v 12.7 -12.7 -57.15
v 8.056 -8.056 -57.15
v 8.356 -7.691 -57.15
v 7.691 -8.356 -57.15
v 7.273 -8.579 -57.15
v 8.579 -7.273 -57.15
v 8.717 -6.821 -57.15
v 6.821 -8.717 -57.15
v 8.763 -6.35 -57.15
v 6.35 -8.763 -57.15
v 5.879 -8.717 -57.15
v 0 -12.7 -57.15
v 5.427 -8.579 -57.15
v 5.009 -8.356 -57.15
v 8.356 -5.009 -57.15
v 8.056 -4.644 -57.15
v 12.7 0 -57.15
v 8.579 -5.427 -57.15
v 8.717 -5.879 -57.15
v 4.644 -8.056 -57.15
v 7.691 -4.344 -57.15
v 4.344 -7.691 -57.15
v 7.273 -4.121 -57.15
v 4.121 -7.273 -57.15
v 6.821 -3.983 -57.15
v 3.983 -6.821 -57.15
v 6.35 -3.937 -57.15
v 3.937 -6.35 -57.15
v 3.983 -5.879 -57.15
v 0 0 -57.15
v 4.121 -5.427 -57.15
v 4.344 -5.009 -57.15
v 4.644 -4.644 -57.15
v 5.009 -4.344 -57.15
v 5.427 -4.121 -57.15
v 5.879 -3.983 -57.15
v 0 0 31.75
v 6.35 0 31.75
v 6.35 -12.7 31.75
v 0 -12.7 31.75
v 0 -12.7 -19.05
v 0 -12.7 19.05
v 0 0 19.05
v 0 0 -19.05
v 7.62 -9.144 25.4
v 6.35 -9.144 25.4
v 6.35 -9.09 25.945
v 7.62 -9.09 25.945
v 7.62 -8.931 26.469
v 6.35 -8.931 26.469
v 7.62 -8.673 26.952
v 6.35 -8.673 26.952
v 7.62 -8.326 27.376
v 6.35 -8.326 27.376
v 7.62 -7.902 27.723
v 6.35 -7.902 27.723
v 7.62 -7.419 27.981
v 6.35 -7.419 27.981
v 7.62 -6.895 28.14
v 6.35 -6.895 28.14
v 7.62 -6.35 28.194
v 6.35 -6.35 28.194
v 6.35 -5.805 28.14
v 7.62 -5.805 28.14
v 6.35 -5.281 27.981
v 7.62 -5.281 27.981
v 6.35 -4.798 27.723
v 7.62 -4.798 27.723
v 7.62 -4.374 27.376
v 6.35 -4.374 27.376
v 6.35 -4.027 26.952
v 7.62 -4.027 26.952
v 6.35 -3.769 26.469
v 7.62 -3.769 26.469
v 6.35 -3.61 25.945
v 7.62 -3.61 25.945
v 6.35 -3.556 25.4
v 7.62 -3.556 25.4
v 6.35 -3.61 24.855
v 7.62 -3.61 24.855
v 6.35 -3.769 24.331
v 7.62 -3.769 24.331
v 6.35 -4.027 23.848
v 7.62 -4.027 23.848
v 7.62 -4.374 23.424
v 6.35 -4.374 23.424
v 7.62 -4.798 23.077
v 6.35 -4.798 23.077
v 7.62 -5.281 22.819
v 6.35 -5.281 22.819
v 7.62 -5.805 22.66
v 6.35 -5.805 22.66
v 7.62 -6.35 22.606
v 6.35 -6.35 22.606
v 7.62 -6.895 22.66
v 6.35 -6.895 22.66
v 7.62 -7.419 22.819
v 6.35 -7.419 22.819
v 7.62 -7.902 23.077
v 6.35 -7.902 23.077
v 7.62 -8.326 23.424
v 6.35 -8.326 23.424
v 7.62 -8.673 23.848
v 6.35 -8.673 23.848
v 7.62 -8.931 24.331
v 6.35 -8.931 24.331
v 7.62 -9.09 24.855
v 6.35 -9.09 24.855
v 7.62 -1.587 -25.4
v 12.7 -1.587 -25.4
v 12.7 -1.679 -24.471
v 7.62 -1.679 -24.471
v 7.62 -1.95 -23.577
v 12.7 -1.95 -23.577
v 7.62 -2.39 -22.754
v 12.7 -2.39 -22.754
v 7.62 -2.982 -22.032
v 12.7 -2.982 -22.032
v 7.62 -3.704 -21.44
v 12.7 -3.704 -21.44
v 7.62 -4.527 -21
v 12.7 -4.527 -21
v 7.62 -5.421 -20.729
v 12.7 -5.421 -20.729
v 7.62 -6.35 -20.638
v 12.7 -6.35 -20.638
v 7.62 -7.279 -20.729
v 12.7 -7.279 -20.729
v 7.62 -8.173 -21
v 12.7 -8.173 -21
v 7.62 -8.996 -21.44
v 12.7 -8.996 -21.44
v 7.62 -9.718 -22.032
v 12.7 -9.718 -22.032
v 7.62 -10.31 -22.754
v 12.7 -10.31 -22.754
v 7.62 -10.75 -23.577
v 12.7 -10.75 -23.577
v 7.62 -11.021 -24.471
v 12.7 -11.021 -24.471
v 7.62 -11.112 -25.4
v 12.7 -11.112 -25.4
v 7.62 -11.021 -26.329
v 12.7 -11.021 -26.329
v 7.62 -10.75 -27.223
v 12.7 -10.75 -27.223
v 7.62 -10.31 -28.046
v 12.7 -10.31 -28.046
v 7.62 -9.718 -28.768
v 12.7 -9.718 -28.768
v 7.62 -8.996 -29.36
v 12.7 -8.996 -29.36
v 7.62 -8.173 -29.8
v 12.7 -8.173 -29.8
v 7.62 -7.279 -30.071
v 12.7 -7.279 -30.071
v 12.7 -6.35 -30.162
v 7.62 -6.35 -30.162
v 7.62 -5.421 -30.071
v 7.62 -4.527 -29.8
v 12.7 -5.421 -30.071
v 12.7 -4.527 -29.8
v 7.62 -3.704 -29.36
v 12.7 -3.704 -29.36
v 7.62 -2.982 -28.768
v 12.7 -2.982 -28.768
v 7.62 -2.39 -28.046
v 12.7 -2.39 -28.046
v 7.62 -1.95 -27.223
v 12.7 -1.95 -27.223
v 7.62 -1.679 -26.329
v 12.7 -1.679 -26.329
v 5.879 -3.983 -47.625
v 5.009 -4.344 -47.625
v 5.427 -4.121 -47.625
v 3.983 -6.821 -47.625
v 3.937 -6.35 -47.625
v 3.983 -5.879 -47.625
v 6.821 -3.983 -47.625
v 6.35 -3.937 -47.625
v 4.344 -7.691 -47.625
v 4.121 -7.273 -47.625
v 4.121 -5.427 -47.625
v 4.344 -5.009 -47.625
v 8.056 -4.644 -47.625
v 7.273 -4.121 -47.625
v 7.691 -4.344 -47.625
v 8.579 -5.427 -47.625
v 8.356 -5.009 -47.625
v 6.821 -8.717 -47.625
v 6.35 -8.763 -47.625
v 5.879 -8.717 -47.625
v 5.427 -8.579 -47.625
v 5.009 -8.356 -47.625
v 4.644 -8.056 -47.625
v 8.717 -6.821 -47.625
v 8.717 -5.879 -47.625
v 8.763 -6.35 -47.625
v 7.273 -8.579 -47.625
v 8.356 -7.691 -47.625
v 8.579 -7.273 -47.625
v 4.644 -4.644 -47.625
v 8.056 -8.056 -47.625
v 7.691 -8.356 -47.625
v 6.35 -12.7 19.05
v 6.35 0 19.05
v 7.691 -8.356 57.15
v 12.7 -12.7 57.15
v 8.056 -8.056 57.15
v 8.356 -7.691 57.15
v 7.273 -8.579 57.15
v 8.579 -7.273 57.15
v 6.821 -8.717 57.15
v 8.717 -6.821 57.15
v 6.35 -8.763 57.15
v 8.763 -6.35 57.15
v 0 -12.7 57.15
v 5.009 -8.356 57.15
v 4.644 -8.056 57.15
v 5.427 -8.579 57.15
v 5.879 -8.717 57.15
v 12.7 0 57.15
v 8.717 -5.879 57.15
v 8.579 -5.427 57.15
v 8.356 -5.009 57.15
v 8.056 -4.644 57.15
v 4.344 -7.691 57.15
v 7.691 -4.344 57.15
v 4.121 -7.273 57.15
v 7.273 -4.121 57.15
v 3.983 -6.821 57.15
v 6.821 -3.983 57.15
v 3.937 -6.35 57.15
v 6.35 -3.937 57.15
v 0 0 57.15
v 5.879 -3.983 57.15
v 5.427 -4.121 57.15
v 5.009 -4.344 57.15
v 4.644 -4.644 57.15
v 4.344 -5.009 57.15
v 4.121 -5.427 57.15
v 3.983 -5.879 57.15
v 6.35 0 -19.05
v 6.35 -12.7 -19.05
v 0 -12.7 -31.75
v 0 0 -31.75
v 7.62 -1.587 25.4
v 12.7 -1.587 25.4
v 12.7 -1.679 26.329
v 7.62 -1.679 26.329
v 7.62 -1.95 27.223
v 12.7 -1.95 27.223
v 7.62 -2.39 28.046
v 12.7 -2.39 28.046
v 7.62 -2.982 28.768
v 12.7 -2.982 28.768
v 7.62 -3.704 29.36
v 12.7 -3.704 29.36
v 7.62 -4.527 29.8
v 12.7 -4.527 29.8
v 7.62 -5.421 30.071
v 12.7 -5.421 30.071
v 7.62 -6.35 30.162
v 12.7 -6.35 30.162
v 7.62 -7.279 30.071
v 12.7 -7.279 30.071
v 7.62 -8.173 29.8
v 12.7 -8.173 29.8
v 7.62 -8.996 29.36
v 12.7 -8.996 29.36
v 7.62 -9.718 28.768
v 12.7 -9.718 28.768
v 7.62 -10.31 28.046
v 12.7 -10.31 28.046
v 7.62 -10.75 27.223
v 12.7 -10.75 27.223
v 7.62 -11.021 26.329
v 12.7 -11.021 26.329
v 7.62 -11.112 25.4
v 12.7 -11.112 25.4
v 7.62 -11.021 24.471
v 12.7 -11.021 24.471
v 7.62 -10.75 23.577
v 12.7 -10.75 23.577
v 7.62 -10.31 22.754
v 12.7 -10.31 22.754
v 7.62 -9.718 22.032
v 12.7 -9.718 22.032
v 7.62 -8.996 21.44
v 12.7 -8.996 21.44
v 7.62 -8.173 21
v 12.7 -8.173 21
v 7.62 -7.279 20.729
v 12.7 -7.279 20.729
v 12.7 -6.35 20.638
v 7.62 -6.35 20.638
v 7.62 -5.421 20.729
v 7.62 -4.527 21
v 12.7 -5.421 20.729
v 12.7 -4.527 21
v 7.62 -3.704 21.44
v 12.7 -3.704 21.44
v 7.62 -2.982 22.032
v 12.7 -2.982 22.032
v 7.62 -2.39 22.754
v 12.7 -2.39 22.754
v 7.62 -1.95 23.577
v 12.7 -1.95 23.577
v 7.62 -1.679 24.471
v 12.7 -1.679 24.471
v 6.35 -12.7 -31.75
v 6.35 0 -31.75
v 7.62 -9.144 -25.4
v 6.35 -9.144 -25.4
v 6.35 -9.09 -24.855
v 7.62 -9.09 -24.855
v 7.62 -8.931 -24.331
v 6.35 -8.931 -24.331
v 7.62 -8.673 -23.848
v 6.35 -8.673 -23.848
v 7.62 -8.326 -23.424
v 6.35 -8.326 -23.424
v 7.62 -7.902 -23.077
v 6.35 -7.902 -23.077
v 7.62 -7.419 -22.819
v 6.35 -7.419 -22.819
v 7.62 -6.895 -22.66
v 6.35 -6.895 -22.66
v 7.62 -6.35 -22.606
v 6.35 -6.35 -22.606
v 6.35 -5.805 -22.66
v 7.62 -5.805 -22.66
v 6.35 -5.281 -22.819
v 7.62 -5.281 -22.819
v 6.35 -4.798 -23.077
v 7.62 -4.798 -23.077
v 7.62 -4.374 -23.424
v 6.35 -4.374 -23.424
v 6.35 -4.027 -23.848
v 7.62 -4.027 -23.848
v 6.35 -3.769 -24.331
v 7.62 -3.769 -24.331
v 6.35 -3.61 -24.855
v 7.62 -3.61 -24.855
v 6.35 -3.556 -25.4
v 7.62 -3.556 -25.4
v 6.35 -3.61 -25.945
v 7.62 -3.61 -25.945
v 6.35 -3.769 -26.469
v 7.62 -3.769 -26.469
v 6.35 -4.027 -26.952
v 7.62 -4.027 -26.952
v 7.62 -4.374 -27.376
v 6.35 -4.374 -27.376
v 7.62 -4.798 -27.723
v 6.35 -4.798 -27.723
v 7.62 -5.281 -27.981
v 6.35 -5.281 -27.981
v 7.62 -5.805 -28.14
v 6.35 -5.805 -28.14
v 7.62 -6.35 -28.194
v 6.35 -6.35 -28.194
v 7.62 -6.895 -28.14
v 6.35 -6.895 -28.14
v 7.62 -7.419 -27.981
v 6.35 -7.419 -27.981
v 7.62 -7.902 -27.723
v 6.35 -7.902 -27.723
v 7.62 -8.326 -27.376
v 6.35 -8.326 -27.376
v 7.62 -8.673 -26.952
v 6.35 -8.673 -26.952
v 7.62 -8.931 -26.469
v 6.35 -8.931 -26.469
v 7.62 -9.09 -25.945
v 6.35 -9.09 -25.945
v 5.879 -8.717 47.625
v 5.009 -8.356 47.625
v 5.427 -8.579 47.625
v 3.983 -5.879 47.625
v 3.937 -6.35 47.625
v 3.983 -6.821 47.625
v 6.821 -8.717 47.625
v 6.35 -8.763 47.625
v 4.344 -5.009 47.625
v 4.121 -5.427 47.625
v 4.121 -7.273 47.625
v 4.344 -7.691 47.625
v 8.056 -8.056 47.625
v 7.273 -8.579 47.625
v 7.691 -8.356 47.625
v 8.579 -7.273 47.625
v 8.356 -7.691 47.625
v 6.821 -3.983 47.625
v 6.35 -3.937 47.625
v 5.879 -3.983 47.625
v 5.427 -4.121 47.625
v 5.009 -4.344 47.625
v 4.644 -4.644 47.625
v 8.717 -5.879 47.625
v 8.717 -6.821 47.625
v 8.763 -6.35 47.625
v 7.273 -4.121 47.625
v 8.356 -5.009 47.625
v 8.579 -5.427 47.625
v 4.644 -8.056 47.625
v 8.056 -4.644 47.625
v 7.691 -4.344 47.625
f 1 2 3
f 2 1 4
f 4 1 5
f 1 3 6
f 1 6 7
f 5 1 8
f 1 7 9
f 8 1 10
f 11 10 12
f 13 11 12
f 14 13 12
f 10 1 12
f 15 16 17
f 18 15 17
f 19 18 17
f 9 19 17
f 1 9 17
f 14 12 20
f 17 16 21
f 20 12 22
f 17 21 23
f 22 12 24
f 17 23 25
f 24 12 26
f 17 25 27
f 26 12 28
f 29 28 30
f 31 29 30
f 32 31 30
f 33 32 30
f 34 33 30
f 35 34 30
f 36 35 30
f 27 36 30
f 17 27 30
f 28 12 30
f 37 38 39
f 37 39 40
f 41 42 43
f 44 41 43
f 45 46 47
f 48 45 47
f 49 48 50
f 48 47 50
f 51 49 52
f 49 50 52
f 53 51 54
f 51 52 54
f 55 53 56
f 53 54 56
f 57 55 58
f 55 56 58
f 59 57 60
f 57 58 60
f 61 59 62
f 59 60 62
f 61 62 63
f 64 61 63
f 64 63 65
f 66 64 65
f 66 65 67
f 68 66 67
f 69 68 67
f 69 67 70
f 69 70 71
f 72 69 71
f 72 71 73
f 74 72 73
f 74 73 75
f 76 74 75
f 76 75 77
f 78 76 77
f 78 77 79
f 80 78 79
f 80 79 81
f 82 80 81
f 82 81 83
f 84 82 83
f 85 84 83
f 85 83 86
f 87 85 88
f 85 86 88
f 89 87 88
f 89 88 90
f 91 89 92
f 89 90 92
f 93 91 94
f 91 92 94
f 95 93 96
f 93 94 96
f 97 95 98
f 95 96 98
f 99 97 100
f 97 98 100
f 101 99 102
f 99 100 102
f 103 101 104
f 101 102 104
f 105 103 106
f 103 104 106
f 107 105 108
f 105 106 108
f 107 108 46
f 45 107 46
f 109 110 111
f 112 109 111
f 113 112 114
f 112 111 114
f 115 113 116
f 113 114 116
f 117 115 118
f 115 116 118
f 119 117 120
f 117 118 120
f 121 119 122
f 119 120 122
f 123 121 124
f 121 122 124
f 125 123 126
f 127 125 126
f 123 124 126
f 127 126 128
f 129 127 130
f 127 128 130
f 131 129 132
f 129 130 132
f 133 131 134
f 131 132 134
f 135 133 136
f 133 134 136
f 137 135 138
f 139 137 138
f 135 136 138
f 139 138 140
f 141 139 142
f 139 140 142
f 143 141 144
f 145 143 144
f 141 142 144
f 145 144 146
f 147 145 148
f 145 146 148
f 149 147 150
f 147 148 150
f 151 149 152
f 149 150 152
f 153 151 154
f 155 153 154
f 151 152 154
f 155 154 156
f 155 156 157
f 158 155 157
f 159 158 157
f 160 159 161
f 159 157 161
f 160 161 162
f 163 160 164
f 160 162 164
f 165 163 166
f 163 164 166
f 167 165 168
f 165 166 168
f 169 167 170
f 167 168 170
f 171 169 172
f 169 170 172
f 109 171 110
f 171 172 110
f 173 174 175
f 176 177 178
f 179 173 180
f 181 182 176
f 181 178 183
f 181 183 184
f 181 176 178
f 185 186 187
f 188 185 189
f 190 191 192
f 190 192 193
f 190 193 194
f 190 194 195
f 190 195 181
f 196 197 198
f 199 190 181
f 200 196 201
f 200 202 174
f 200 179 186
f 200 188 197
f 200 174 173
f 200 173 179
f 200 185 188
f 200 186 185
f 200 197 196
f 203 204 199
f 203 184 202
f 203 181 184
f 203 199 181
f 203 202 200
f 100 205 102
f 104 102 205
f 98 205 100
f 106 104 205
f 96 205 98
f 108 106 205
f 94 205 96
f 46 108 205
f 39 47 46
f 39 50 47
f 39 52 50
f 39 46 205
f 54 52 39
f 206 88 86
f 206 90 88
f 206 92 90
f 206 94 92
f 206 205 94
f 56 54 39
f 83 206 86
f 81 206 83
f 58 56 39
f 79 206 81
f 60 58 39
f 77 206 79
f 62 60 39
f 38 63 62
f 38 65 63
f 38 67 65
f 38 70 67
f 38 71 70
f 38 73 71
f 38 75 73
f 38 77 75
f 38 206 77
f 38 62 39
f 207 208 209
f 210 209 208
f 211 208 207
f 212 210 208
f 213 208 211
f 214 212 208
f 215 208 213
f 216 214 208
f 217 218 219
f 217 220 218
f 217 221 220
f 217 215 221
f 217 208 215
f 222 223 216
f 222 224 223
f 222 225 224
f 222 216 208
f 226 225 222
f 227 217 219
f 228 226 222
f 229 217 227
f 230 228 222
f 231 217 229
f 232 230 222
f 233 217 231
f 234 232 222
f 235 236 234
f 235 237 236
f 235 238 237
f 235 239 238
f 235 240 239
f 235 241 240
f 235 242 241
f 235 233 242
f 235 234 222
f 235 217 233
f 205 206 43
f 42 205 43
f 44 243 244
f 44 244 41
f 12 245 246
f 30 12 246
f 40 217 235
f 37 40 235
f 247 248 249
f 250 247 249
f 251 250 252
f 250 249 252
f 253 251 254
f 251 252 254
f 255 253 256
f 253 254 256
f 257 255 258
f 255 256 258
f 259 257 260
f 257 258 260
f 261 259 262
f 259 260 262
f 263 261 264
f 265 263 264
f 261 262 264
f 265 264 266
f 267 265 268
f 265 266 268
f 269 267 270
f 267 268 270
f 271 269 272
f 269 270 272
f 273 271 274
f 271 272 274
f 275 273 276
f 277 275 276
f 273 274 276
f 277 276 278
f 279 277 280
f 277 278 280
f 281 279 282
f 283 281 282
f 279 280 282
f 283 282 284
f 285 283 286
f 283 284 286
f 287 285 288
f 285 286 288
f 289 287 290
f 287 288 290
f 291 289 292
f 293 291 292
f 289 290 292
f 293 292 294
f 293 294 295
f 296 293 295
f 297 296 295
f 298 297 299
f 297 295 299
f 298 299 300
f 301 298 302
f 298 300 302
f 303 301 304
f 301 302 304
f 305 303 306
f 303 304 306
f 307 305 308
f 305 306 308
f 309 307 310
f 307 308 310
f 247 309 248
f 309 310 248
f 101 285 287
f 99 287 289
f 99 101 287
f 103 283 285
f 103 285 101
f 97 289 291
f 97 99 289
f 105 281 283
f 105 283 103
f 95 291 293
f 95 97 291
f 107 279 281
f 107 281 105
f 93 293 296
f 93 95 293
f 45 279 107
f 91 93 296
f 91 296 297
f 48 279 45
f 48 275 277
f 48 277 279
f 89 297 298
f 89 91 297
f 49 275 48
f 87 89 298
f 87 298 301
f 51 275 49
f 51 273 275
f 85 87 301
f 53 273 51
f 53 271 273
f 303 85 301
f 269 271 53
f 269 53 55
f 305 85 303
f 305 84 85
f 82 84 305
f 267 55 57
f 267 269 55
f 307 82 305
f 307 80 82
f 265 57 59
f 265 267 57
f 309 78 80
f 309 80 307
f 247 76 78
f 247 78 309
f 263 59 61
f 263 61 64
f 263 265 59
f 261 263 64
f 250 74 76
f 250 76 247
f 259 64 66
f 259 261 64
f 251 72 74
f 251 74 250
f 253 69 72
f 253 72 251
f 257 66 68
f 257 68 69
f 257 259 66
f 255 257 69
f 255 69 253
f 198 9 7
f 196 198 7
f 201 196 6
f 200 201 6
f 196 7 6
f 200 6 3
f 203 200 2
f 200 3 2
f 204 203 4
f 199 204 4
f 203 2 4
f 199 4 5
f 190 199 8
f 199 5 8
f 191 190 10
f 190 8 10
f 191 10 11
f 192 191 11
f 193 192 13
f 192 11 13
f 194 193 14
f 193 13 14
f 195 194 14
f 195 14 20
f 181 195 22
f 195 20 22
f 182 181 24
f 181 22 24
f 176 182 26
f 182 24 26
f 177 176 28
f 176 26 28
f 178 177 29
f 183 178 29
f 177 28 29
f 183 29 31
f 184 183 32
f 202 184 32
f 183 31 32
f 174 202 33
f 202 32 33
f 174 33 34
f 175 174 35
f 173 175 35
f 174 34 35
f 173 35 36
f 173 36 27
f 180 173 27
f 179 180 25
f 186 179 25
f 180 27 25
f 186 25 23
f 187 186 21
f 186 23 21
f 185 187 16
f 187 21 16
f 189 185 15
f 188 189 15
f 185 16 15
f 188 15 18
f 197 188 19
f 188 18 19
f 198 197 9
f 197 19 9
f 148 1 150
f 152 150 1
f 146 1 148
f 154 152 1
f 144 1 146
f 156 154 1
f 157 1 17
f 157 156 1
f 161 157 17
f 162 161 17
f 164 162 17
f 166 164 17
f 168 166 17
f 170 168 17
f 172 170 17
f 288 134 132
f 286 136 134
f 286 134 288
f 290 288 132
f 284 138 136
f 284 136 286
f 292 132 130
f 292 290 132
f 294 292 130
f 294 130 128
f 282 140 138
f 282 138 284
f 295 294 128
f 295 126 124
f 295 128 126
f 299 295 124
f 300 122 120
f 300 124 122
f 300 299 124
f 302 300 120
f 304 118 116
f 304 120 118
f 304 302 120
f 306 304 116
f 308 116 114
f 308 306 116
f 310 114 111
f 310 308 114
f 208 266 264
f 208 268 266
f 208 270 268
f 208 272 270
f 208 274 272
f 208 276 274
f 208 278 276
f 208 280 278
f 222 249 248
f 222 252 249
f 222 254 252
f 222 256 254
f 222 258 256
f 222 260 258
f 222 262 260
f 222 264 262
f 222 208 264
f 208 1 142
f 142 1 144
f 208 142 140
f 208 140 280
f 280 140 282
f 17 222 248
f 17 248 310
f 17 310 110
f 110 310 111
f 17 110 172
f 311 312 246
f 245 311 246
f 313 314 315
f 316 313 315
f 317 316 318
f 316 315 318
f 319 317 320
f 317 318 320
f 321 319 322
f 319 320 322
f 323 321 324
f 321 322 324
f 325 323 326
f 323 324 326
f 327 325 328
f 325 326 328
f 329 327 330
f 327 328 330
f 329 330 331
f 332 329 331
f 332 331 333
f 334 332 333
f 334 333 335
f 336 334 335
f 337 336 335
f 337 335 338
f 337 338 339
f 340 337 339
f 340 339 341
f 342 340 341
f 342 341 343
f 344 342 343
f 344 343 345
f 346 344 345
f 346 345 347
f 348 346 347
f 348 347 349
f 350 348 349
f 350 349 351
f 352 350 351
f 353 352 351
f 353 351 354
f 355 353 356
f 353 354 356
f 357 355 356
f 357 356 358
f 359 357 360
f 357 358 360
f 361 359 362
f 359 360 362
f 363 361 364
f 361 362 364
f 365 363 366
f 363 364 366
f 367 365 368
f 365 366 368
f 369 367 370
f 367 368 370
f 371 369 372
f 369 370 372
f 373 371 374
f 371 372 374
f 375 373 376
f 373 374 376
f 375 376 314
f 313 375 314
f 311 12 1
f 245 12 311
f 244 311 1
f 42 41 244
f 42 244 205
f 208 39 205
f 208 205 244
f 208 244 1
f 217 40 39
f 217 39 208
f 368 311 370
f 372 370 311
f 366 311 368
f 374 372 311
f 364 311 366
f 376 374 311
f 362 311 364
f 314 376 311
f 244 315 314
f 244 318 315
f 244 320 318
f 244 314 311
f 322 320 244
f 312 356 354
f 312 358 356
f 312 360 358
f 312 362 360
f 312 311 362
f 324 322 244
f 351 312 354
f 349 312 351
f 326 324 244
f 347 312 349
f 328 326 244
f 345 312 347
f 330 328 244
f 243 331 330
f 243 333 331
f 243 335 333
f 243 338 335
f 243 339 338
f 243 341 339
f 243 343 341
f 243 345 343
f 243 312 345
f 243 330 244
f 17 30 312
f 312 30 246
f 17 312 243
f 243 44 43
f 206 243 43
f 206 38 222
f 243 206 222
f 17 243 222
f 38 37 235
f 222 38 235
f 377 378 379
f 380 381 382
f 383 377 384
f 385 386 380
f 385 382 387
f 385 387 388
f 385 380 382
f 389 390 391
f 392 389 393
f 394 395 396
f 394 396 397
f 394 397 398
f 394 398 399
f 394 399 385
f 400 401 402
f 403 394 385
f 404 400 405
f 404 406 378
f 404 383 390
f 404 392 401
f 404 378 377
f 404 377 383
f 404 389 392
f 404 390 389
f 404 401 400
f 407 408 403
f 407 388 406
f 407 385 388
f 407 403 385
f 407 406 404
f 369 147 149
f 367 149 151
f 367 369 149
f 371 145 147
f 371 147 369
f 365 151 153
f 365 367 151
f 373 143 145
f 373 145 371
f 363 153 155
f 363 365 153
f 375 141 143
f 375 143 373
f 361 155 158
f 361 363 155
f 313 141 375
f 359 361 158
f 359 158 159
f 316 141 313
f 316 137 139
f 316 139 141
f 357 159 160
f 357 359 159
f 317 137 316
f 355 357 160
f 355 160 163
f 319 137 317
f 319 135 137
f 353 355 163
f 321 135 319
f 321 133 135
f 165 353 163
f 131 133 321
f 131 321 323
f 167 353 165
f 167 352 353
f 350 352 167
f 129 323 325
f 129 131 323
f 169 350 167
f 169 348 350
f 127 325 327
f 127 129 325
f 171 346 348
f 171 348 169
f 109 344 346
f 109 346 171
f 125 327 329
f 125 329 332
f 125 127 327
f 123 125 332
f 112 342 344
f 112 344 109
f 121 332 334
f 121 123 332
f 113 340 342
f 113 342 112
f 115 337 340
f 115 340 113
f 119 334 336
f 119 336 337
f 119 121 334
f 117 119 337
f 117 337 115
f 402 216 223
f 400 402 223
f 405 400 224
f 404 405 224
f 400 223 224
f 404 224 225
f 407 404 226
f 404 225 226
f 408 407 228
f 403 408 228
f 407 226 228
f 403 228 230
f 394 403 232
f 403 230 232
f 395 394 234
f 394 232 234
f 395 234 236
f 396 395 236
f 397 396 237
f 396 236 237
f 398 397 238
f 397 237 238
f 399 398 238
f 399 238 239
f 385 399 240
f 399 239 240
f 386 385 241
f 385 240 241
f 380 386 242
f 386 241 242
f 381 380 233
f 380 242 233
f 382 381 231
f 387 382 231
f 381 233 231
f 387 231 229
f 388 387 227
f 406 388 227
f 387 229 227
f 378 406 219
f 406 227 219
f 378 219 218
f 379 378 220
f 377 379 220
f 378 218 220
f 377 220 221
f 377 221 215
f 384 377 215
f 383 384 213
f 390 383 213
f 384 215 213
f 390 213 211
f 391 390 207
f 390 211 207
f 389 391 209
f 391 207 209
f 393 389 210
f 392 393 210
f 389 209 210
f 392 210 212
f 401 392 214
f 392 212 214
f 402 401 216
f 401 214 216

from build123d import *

# Parameters (mm, degrees)
F0_W      = 12.7
F0_H      = 114.3
F1_DEPTH  = 12.7
F2_W      = 6.35
F2_H      = 12.7
F3_DEPTH  = 12.701
F4_R      = 2.794
F5_DEPTH  = 6.351
F6_R      = 4.7625
F7_DEPTH  = 5.08
F8_R      = 2.413
F9_DEPTH  = 9.525
F10_R     = 2.413
F11_DEPTH = 9.525


with BuildPart() as f1:
    # F0 (on Right) → F1 (new body)
    with BuildSketch(Plane.YZ):
        with Locations((-6.35, 0)):
            Rectangle(F0_W, F0_H)
    extrude(amount=F1_DEPTH)

    # F2 (on face) → F3 (cut, through all)
    with BuildSketch(Plane(origin=(0, 0, 0), x_dir=(-1, 0, 0), z_dir=(0, 1, 0))):
        with Locations((-3.175, 25.4)):
            Rectangle(F2_W, F2_H)
        with Locations((-3.175, -25.4)):
            Rectangle(F2_W, F2_H)
    extrude(amount=-F3_DEPTH, mode=Mode.SUBTRACT)

    # F4 (on face) → F5 (cut, through all)
    with BuildSketch(Plane(origin=(6.35, 0, 0), x_dir=(0, -1, 0), z_dir=(-1, 0, 0))):
        with Locations((6.35, 25.4)):
            Circle(F4_R)
        with Locations((6.35, -25.4)):
            Circle(F4_R)
    extrude(amount=-F5_DEPTH, mode=Mode.SUBTRACT)

    # F6 (on face) → F7 (cut)
    with BuildSketch(Plane.YZ.offset(12.7)):
        with Locations((-6.35, 25.4)):
            Circle(F6_R)
        with Locations((-6.35, -25.4)):
            Circle(F6_R)
    extrude(amount=-F7_DEPTH, mode=Mode.SUBTRACT)

    # F8 (on face) → F9 (cut)
    with BuildSketch(Plane.XY.offset(57.15)):
        with Locations((6.35, -6.35)):
            Circle(F8_R)
    extrude(amount=-F9_DEPTH, mode=Mode.SUBTRACT)

    # F10 (on face) → F11 (cut)
    with BuildSketch(Plane(origin=(0, 0, -57.15), x_dir=(1, 0, 0), z_dir=(0, 0, -1))):
        with Locations((6.35, 6.35)):
            Circle(F10_R)
    extrude(amount=-F11_DEPTH, mode=Mode.SUBTRACT)


solid = f1.part
